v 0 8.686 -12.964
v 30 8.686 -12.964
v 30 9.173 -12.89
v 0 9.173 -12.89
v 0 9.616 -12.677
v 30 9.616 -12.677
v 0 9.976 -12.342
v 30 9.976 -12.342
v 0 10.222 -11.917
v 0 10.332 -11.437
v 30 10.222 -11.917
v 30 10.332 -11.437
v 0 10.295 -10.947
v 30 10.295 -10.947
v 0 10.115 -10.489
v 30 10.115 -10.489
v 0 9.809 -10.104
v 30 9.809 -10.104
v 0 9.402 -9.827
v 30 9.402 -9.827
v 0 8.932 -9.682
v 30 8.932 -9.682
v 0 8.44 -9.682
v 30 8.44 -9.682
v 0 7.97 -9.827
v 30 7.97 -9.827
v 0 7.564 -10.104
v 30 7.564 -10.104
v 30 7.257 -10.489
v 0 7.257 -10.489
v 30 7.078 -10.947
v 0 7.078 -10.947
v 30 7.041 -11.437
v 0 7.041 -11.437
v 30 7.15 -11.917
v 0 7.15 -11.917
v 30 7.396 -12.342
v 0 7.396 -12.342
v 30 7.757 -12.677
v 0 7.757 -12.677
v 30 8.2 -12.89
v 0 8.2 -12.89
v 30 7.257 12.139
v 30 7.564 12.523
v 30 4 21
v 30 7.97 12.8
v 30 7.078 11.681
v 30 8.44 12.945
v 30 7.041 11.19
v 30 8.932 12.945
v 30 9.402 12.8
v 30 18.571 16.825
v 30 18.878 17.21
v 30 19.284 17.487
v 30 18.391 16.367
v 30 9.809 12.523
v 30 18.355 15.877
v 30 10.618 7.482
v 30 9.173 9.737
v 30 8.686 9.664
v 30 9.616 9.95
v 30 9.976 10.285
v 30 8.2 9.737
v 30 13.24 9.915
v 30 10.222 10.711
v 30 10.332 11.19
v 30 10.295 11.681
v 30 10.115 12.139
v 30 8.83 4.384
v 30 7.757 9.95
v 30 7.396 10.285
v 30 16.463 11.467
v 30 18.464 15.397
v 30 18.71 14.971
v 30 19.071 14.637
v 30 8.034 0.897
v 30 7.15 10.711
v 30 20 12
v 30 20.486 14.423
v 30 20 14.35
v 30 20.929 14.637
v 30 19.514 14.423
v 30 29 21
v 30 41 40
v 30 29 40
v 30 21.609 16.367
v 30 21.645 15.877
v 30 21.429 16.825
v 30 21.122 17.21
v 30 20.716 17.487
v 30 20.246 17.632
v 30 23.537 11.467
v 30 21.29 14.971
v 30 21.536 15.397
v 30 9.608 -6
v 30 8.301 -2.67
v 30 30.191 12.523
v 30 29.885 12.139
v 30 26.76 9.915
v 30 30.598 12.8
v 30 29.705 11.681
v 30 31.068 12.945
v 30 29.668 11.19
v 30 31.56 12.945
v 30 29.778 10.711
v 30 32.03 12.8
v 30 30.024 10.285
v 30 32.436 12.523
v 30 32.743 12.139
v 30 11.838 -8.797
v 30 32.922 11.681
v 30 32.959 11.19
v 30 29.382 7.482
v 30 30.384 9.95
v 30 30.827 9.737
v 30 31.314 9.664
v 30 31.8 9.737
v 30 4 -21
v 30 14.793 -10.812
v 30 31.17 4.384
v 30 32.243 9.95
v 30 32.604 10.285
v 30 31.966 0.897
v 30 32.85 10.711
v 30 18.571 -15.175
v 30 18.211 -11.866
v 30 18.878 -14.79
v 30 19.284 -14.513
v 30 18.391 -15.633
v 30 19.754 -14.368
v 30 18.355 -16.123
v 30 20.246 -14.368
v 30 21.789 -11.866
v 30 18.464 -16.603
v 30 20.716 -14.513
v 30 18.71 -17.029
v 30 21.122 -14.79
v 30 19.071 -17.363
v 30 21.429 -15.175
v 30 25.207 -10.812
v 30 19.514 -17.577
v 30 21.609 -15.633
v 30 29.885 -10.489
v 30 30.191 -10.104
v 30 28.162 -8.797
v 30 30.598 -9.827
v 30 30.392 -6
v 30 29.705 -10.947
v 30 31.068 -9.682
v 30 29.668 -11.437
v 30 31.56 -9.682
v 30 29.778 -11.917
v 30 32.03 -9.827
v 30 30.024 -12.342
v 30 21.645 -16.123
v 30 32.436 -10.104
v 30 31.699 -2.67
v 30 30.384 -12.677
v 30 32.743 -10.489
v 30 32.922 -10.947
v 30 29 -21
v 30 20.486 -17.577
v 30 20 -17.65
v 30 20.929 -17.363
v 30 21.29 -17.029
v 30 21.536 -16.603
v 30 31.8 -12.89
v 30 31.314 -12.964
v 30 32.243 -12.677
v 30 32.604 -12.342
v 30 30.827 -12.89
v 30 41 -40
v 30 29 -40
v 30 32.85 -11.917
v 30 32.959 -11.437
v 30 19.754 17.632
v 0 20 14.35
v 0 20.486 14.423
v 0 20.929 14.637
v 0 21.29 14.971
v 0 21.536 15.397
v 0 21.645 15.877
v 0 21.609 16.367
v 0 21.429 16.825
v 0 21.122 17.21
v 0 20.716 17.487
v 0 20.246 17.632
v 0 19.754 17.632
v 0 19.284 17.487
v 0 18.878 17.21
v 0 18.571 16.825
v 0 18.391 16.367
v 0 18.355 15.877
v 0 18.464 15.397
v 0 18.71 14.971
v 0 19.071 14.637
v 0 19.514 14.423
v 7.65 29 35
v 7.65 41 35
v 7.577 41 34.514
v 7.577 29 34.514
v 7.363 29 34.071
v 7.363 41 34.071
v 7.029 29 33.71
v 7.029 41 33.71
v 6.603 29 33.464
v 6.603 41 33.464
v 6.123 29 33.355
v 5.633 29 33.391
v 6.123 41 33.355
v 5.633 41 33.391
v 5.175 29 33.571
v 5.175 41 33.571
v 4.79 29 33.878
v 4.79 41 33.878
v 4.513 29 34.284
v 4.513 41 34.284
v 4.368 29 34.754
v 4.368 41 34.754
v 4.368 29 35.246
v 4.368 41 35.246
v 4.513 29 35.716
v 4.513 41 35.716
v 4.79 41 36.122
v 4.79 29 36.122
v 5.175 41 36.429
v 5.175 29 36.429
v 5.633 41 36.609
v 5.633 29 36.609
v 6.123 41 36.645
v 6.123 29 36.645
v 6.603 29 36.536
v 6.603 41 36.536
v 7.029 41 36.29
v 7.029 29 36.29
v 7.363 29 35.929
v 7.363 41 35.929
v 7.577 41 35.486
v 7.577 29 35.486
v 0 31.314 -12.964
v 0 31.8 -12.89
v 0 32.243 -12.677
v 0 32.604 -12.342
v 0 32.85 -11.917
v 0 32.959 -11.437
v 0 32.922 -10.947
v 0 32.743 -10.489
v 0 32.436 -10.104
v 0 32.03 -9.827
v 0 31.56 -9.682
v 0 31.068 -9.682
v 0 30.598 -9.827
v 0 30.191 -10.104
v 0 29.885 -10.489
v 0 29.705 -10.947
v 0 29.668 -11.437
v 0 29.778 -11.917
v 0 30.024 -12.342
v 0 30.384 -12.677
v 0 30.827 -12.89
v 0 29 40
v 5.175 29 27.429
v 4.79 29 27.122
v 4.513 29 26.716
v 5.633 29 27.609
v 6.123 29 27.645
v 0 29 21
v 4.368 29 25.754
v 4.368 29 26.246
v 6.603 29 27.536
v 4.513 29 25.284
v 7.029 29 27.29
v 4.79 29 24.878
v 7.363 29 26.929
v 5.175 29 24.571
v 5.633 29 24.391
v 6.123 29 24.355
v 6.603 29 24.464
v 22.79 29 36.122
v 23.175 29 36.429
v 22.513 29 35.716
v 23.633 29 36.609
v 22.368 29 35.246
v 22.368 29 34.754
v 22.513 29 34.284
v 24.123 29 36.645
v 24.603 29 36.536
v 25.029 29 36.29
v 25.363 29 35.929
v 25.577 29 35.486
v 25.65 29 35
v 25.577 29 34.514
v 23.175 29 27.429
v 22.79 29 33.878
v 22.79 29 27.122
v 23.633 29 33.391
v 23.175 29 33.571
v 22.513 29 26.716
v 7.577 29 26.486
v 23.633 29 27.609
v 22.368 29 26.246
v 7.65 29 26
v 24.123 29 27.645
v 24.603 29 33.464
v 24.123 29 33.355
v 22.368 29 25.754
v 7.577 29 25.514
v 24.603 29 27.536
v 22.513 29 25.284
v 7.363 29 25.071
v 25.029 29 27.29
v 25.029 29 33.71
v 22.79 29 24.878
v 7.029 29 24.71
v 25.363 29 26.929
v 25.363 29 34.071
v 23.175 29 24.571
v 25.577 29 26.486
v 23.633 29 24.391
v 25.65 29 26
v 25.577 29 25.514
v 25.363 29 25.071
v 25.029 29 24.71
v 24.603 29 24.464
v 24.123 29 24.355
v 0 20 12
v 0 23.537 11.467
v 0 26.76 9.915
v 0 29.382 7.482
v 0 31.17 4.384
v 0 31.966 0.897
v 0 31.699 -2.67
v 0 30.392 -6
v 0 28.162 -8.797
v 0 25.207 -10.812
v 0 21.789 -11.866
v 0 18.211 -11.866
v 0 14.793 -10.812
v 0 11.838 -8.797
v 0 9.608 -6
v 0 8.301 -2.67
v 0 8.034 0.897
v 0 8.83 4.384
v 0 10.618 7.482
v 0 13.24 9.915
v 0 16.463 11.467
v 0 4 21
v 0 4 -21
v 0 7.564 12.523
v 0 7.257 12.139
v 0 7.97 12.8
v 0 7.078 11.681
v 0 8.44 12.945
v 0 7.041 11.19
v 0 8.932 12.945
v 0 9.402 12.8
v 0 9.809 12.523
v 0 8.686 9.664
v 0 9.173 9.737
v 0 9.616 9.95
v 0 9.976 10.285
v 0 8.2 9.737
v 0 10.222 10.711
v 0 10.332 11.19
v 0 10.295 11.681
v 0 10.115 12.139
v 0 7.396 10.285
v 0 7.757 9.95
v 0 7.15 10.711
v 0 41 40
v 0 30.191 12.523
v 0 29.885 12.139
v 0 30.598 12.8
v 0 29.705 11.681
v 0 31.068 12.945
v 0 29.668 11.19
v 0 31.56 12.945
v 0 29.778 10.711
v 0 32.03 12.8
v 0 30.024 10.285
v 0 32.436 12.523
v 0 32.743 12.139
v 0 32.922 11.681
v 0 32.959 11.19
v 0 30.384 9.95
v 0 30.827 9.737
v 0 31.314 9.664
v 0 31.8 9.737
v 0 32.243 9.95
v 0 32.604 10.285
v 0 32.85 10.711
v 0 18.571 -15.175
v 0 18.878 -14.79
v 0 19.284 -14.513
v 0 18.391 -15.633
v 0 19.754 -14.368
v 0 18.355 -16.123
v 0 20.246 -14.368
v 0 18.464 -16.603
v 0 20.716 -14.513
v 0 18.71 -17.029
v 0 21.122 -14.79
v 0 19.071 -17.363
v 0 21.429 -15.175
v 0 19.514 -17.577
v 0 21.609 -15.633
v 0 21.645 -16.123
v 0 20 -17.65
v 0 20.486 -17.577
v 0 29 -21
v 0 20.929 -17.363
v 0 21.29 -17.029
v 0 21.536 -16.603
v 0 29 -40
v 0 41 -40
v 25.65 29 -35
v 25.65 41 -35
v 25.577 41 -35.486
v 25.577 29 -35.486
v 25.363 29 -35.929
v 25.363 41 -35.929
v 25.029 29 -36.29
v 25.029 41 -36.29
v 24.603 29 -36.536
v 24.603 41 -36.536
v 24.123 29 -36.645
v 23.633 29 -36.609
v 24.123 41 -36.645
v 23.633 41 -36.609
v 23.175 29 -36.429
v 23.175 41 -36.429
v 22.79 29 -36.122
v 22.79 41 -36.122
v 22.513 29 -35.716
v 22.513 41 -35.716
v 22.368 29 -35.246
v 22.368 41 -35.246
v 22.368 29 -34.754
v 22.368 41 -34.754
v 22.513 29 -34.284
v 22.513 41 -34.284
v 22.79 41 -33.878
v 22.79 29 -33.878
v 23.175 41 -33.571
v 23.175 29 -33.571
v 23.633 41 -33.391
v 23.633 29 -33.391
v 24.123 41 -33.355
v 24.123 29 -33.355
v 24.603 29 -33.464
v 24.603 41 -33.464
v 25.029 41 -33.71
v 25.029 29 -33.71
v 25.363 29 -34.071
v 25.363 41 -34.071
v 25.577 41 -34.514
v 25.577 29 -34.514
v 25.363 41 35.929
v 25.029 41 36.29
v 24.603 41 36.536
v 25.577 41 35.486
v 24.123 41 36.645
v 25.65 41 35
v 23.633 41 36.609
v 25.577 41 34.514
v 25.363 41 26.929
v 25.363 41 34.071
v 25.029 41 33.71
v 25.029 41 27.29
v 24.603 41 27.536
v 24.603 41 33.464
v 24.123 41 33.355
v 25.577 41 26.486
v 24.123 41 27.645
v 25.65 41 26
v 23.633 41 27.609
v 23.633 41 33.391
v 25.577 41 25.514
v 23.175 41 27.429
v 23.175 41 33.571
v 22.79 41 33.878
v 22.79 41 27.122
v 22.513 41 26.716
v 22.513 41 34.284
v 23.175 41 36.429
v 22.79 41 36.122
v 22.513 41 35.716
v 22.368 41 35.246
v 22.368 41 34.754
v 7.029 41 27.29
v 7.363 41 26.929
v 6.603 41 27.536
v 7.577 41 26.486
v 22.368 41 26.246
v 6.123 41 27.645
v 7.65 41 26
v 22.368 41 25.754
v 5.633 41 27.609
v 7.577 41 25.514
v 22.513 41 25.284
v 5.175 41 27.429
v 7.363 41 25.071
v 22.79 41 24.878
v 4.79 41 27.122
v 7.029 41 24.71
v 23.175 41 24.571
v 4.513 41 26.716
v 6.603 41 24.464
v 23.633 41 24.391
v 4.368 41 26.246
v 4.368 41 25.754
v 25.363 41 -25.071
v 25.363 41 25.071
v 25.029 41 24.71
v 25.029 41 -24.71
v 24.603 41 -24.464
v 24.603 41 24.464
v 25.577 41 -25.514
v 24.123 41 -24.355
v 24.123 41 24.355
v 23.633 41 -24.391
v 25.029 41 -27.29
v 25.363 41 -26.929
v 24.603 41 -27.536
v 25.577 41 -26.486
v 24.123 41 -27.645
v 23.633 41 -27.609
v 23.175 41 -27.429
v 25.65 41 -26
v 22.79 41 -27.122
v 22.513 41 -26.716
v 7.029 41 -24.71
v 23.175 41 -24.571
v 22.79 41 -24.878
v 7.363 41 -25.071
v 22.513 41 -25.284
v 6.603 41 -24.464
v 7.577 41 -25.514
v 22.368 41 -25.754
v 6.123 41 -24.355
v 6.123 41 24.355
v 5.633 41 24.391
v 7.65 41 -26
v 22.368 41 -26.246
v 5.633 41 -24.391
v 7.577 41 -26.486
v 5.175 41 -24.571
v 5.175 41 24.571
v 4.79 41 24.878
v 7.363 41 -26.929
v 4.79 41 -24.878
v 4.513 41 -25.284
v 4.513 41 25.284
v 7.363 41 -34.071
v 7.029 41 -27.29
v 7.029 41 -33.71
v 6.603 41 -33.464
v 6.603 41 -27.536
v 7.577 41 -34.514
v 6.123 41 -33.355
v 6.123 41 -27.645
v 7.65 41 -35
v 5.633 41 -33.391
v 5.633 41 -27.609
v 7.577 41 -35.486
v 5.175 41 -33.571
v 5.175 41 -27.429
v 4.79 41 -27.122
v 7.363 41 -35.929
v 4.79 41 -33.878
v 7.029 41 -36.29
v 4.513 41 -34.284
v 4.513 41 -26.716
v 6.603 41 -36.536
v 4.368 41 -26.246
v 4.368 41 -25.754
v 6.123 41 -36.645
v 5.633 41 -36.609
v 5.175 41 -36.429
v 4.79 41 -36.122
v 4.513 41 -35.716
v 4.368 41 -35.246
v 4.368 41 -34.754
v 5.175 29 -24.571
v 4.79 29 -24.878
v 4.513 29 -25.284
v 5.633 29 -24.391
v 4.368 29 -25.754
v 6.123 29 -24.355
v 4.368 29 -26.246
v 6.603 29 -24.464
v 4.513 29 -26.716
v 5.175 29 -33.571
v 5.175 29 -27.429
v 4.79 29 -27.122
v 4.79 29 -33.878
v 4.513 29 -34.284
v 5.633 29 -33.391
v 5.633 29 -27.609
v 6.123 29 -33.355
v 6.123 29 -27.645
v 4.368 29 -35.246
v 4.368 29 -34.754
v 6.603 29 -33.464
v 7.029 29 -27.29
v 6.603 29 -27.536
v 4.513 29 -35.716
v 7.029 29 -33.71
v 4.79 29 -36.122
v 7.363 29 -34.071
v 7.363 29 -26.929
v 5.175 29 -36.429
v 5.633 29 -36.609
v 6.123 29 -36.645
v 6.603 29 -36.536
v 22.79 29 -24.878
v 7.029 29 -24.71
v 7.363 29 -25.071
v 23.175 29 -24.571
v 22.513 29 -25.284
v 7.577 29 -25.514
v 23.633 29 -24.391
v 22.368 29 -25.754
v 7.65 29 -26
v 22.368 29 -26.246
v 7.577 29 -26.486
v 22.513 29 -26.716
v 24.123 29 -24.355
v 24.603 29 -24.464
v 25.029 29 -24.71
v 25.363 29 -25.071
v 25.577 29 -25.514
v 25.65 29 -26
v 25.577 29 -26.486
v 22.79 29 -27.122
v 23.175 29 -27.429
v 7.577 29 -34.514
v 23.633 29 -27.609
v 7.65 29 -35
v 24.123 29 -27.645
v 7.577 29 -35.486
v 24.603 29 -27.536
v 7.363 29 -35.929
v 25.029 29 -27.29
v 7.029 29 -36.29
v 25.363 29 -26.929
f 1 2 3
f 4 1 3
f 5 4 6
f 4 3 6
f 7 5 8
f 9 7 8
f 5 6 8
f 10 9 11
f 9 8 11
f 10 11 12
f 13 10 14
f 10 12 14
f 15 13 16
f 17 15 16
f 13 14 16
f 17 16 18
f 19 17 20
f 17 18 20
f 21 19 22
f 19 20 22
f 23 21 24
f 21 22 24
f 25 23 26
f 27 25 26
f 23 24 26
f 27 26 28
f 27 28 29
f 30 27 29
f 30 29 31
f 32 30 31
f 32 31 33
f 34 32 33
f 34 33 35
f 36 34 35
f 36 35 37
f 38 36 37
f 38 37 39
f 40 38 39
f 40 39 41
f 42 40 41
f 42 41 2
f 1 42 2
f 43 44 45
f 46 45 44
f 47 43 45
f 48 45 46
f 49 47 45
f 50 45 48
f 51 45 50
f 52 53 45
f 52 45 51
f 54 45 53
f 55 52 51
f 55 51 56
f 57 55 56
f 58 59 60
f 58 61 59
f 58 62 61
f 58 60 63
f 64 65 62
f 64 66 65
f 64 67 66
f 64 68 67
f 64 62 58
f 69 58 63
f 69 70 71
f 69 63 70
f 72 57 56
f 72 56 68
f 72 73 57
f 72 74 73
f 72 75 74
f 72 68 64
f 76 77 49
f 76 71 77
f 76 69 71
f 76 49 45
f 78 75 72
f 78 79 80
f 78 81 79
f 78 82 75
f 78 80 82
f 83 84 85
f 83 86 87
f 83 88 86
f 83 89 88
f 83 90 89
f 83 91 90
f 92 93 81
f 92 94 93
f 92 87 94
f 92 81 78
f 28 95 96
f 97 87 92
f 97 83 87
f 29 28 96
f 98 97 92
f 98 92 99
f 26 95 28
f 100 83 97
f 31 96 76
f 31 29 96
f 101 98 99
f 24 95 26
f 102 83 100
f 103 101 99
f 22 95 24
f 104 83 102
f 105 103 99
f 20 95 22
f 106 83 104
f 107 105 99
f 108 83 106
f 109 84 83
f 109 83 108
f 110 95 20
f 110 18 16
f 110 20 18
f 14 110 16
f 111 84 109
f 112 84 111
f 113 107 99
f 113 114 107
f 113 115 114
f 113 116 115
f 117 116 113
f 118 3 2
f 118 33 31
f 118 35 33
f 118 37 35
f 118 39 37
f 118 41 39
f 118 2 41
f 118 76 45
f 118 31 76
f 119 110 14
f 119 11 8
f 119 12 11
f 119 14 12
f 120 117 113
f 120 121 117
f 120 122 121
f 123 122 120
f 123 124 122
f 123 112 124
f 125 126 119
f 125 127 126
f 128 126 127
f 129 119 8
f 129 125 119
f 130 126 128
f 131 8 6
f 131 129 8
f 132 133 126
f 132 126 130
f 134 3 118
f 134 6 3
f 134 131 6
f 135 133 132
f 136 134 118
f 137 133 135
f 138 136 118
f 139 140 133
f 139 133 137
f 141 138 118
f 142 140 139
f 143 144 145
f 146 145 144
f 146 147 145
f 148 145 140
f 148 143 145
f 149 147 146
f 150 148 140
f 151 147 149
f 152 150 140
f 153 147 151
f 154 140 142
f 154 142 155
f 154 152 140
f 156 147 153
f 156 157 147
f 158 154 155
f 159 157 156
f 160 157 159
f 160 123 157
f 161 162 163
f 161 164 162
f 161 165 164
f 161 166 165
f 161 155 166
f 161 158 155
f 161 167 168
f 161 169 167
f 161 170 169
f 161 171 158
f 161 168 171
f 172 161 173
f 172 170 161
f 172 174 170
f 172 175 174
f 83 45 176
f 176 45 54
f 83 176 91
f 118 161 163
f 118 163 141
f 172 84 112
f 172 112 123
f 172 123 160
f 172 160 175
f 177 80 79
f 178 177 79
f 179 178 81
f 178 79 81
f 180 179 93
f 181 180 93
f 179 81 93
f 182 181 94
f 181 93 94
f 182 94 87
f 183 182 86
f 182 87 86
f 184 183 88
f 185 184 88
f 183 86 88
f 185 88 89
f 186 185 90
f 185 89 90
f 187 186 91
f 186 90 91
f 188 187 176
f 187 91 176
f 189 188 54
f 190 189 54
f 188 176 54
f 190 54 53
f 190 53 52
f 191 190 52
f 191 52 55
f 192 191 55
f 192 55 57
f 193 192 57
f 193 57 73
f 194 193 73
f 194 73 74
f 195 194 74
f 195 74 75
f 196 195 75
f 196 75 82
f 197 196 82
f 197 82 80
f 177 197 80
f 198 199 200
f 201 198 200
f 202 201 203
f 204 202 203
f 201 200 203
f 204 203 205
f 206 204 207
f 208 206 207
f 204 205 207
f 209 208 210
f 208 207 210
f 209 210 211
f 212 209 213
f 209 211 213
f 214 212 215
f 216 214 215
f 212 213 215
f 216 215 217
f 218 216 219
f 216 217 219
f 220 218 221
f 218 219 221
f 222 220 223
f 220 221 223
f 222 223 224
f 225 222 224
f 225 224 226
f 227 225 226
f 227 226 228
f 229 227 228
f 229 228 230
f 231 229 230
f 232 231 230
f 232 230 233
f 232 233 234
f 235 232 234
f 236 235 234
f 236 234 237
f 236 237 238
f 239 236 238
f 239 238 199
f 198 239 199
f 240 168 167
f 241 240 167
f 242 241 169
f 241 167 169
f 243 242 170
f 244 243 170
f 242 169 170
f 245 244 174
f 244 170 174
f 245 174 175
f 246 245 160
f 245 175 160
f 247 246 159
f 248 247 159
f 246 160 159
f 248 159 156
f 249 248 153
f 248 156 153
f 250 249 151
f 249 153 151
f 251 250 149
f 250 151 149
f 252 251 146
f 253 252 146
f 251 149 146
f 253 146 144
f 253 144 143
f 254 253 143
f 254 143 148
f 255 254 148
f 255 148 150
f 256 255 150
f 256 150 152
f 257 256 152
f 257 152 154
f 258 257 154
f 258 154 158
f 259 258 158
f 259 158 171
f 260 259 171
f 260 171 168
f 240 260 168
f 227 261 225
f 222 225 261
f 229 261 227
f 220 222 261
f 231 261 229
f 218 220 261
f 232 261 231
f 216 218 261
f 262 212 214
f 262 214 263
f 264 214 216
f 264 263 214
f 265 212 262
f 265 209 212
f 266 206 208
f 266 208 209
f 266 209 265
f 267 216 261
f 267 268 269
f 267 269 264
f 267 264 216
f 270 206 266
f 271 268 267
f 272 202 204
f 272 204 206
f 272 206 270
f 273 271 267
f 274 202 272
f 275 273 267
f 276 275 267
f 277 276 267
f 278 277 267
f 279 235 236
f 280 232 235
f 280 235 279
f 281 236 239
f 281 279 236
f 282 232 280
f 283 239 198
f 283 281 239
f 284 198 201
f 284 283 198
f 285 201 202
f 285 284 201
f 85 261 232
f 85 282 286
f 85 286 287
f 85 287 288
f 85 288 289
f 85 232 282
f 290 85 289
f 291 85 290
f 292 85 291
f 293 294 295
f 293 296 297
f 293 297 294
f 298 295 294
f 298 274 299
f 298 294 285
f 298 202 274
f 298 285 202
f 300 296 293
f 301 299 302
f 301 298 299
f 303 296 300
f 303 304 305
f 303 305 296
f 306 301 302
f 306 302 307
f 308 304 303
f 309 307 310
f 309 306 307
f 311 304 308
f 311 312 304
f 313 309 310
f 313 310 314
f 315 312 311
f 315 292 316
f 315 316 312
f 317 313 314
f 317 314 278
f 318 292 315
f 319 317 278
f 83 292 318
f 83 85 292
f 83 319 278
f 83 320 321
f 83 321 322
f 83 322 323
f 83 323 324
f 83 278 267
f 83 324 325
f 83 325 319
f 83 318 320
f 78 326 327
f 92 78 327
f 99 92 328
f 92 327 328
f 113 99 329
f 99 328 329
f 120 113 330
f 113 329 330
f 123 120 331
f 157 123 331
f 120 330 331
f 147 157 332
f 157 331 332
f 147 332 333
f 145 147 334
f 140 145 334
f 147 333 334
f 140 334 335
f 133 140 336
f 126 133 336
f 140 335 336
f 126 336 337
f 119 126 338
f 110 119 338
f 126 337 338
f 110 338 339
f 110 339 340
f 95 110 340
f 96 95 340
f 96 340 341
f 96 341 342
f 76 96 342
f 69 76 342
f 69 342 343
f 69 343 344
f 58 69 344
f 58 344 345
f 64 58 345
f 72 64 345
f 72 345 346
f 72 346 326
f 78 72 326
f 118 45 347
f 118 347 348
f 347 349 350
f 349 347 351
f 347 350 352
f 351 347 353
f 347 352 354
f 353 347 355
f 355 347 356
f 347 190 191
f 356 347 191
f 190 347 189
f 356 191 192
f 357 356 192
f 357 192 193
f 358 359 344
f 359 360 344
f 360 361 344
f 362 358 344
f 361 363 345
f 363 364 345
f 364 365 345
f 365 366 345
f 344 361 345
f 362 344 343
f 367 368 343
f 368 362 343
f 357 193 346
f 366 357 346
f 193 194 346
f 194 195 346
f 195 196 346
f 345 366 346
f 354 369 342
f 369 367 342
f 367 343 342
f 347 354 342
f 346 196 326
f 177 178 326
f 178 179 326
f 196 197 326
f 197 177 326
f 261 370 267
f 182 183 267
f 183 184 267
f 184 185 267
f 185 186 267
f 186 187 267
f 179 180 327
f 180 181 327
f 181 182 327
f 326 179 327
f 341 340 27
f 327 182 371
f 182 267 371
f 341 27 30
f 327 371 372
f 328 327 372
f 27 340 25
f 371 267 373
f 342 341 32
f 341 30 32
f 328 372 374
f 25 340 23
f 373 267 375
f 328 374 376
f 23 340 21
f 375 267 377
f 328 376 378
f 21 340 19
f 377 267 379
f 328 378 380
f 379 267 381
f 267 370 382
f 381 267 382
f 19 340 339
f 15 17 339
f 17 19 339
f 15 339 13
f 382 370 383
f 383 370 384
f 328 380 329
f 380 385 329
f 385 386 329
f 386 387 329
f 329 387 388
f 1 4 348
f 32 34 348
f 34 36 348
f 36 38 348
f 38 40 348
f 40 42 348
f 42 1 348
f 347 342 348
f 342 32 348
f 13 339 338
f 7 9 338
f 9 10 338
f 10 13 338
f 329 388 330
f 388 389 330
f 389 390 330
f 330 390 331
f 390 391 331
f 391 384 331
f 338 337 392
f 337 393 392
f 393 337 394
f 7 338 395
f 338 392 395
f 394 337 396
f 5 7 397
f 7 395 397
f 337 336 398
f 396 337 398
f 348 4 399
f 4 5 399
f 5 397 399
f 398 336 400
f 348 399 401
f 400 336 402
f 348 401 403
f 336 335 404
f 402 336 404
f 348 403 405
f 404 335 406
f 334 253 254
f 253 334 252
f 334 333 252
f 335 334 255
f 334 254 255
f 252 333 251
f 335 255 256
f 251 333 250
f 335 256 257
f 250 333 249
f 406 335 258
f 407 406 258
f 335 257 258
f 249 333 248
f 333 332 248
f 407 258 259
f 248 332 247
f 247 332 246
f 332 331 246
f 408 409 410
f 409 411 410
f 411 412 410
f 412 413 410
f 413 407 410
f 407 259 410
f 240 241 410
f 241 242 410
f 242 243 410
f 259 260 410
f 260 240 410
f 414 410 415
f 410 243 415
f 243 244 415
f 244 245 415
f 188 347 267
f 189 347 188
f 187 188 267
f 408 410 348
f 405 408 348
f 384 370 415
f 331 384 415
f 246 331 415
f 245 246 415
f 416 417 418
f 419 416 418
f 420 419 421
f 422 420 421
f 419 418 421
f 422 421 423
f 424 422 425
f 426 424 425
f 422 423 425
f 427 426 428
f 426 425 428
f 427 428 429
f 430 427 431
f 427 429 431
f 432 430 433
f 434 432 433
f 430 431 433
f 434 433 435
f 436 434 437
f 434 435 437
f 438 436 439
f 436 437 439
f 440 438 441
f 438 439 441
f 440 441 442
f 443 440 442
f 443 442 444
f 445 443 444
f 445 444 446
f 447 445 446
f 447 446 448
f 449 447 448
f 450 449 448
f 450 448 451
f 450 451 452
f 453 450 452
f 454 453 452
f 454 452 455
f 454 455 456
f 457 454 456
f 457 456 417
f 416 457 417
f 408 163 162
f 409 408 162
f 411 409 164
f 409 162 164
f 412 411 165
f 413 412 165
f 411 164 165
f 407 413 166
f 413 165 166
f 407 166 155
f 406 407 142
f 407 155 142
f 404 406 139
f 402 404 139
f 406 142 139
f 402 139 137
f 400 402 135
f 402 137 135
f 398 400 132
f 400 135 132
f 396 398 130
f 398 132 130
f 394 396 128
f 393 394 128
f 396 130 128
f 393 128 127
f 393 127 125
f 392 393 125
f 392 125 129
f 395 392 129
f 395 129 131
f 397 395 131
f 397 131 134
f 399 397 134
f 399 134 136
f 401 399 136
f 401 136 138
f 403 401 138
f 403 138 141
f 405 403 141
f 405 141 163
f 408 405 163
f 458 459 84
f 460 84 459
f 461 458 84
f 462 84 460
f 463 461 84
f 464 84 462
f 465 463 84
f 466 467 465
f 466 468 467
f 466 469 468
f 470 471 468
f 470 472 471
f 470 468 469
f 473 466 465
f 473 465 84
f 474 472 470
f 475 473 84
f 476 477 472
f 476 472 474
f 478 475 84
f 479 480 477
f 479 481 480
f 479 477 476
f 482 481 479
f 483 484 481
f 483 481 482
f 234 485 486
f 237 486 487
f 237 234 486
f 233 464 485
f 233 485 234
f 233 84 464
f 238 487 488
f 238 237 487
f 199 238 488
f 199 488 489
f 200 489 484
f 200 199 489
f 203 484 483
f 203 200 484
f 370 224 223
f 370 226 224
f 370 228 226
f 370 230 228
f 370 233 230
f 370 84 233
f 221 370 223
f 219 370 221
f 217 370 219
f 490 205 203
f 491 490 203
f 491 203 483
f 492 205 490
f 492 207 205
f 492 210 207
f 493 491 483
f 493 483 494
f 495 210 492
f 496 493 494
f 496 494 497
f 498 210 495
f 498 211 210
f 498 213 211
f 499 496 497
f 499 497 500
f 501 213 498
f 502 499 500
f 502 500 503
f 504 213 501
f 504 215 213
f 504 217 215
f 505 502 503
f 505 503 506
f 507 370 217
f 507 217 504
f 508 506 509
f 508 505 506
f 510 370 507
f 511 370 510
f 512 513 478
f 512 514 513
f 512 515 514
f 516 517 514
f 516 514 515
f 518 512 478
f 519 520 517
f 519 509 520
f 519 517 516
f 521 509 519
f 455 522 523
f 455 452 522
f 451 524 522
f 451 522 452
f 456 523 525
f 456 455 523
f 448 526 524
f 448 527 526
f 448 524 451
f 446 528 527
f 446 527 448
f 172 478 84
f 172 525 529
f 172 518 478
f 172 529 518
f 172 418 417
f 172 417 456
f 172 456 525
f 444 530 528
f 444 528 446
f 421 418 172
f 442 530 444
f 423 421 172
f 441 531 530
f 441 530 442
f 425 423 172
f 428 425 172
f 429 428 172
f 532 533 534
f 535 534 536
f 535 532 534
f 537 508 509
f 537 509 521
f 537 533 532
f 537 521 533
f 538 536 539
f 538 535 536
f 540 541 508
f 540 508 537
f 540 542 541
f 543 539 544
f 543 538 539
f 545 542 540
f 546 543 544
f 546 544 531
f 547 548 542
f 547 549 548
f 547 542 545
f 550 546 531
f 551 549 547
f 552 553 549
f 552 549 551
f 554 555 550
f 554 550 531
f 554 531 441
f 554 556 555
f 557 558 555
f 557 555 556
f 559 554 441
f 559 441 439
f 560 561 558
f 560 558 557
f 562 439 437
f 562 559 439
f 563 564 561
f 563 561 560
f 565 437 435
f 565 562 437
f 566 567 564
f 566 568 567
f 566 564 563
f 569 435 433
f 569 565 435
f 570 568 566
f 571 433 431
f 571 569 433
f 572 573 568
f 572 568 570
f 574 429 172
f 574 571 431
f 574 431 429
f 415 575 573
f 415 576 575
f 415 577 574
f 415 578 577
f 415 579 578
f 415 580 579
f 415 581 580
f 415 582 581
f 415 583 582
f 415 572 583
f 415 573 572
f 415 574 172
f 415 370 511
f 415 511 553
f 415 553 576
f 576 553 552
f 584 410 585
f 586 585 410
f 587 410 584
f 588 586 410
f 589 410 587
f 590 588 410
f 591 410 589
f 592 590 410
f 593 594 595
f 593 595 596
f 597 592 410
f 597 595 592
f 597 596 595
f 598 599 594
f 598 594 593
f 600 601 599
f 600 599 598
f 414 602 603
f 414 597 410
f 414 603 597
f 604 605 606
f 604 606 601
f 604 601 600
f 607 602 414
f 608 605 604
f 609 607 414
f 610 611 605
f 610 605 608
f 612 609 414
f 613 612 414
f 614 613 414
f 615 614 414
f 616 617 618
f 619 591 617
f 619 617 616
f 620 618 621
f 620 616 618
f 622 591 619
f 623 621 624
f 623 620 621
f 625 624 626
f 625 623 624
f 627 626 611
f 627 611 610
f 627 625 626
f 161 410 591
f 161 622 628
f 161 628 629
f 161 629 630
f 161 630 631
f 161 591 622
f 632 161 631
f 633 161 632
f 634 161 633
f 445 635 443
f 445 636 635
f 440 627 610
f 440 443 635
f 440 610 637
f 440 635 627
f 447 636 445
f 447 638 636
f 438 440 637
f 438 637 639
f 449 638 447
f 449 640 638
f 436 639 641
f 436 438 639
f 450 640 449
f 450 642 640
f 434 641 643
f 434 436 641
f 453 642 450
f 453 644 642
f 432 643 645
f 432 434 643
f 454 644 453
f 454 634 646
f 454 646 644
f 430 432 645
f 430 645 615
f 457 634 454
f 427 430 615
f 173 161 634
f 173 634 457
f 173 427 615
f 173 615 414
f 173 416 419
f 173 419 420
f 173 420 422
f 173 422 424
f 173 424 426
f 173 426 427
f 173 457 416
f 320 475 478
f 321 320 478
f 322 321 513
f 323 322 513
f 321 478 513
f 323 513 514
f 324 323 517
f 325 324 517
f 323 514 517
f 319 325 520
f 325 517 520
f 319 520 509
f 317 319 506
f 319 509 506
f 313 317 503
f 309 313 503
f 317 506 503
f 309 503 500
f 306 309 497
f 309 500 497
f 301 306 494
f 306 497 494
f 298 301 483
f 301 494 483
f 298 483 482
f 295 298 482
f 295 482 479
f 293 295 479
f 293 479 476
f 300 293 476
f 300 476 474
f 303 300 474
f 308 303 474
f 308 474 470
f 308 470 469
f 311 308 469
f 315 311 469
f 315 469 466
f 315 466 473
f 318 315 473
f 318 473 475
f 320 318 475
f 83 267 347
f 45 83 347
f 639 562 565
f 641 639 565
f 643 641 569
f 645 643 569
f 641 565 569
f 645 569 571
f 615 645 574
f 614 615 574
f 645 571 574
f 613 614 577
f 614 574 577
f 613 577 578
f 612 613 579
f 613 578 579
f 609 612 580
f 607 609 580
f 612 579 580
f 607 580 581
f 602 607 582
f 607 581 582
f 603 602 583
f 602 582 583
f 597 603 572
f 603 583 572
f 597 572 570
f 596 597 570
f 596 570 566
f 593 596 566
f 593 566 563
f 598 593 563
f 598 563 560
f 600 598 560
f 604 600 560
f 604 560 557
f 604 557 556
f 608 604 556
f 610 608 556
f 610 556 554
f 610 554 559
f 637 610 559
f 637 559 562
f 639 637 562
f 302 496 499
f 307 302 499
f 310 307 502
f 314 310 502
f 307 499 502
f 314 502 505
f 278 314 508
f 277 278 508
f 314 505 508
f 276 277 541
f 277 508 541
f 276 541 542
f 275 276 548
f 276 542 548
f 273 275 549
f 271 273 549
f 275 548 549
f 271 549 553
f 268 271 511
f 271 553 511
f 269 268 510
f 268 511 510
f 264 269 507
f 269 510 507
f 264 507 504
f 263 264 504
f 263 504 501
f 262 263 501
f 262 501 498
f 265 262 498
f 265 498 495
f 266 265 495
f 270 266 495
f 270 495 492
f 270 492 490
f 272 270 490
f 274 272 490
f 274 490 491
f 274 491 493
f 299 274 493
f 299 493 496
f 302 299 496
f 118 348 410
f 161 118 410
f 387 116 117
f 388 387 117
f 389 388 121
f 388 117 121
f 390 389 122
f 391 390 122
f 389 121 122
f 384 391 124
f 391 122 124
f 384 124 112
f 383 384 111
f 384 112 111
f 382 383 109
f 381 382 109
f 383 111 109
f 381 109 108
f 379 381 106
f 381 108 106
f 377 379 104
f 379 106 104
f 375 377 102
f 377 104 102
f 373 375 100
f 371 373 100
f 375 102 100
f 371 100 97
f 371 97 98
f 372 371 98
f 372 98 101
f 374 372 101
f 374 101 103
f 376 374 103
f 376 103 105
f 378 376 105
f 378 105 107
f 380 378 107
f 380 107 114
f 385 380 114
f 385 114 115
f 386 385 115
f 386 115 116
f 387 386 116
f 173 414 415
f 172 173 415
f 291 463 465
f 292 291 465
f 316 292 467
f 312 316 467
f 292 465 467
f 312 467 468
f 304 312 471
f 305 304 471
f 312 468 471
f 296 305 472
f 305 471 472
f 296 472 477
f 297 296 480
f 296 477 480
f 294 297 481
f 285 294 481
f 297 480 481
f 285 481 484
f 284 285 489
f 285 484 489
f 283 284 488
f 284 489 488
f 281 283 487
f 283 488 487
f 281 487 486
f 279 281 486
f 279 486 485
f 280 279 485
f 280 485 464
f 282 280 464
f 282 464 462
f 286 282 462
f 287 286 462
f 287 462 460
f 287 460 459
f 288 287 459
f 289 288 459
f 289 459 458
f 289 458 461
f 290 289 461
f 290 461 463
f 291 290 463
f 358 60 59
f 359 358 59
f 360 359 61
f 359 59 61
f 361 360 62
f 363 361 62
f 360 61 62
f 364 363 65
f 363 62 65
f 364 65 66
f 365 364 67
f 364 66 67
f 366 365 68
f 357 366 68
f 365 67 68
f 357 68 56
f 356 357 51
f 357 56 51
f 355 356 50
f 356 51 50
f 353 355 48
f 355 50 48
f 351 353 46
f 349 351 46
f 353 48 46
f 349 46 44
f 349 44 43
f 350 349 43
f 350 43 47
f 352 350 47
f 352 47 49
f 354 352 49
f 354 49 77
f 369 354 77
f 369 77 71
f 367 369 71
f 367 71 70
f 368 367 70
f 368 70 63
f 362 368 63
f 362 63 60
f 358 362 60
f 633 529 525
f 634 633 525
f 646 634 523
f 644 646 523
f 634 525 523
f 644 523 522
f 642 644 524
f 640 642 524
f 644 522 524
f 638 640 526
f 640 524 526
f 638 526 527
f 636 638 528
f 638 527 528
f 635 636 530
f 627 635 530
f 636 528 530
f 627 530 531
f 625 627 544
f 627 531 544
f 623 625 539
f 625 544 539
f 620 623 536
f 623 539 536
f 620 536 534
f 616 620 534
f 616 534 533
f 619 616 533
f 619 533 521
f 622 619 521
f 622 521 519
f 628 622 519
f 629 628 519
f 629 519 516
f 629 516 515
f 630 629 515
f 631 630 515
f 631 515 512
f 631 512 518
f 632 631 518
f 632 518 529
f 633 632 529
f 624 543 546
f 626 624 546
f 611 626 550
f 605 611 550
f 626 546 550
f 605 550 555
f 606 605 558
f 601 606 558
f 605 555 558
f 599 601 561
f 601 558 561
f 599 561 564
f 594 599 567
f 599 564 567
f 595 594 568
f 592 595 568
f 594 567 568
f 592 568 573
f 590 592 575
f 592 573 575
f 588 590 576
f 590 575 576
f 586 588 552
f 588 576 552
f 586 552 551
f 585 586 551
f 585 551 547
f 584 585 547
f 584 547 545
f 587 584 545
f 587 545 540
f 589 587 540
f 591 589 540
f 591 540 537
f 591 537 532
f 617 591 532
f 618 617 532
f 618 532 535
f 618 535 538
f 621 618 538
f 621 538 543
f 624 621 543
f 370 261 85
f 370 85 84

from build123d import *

# Parameters (mm, degrees)
SKETCH_2_W          = 80
SKETCH_2_H          = 82
EXTRUDE_2_DEPTH     = 30
SKETCH_3_R          = 12
CUT_EXTRUDE_1_DEPTH = 65.660652641
CUT_EXTRUDE_2_DEPTH = 65.660652641
HOLE_WIZARD_M4_1_D  = 3.3
HOLE_WIZARD_M4_2_D  = 3.3


with BuildPart() as part:
    # 草图2 → 凸台-拉伸2 (new body)
    with BuildSketch(Plane(origin=(0, 0, 0), x_dir=(0, 0, -1), z_dir=(1, 0, 0))):
        Rectangle(SKETCH_2_W, SKETCH_2_H)
    extrude(amount=EXTRUDE_2_DEPTH)

    # 草图3 → 切除-拉伸1 (cut, through all)
    with BuildSketch(Plane.ZY):
        with Locations((0, 20)):
            Circle(SKETCH_3_R)
    extrude(amount=-CUT_EXTRUDE_1_DEPTH, mode=Mode.SUBTRACT)

    # 草图7 → 切除-拉伸2 (cut, through all)
    with BuildSketch(Plane(origin=(30, 0, 0), x_dir=(0, 0, -1), z_dir=(1, 0, 0))):
        Polygon((-40, 29), (-21, 29), (-21, 4), (21, 4), (21, 29), (40, 29), (40, -41), (-40, -41), align=None)
    extrude(amount=-CUT_EXTRUDE_2_DEPTH, mode=Mode.SUBTRACT)

    # M4 螺纹孔1 (through all)
    with Locations(Plane.ZY):
        with Locations((-11.313708499, 31.313708499), (11.313708499, 8.686291501), (11.313708499, 31.313708499), (16, 20), (-11.313708499, 8.686291501), (-16, 20)):
            Hole(HOLE_WIZARD_M4_1_D / 2)

    # M4 螺纹孔2 (through all)
    with Locations(Plane(origin=(0, 29, 0), x_dir=(-1, 0, 0), z_dir=(0, -1, 0))):
        with Locations((-24, 35), (-6, 35), (-6, 26), (-24, 26), (-6, -35), (-6, -26), (-24, -26), (-24, -35)):
            Hole(HOLE_WIZARD_M4_2_D / 2)


solid = part.part
